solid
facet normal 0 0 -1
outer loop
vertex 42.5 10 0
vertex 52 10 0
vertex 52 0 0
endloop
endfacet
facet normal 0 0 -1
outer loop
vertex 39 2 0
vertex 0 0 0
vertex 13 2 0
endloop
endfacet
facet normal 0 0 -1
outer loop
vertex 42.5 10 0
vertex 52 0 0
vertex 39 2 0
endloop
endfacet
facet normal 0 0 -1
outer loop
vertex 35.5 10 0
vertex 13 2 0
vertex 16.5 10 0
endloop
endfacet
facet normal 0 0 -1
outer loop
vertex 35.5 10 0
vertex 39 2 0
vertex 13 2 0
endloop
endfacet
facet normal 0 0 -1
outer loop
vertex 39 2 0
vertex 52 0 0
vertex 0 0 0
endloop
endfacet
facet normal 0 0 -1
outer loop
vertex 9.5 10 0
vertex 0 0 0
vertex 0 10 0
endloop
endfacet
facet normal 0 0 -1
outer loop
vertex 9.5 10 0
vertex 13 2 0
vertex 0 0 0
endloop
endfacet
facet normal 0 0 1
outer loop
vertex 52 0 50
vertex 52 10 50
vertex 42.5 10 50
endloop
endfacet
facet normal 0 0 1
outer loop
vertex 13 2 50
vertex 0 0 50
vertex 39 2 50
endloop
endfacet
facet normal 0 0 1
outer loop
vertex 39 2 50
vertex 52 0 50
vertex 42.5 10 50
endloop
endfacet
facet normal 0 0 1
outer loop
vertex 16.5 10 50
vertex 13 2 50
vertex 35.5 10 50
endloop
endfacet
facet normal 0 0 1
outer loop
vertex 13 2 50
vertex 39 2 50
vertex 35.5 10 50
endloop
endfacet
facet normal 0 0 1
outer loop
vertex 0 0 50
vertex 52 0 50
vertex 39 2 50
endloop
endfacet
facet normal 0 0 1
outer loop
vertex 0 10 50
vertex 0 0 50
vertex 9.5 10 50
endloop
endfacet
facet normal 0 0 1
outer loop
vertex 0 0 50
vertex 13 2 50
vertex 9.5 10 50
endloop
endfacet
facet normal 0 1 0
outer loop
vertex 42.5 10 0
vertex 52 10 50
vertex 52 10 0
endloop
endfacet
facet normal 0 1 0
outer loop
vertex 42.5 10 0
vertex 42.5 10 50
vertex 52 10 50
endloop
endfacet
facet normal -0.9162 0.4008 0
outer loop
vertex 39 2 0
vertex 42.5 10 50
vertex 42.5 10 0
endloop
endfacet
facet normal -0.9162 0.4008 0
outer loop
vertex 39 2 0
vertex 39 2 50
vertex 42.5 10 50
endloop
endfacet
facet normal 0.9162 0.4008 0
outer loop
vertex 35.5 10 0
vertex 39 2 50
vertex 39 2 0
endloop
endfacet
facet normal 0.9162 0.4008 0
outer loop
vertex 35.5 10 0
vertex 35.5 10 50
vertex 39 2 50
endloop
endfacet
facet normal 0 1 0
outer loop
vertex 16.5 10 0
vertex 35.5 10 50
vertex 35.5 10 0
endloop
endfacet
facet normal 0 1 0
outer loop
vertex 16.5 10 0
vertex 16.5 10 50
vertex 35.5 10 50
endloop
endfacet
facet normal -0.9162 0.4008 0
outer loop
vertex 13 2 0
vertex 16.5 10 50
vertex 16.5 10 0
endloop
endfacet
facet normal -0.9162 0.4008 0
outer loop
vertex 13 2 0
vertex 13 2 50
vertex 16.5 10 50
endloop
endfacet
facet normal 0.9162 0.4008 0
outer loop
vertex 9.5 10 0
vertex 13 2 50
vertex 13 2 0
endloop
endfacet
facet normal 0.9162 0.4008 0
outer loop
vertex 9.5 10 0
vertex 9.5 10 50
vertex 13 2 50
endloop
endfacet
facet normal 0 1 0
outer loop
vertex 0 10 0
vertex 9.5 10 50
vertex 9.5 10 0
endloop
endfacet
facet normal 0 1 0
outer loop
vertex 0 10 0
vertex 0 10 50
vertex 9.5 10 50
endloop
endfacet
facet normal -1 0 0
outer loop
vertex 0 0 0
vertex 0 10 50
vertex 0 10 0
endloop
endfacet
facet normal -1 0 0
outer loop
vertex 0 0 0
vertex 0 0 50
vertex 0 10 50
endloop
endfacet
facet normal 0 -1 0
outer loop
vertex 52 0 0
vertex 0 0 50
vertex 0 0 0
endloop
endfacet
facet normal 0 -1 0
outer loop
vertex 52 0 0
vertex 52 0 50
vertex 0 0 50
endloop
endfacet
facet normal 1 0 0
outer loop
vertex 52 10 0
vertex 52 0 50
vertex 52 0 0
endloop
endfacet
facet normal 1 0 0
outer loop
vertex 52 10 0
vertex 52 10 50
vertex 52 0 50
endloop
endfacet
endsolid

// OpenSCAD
$fn = 32;

// ----------------------------------------------------------------------
// V guide rail: doublev, 52 mm wide
// ----------------------------------------------------------------------

// --- parameters (mm) ---
rail_w = 52;              // rail width, X
base_t = 10;              // base plate thickness
v_depth = 8;              // V feature depth / height
v_half_w = 7;             // half width of the V at the base face
plate_t = 50;             // rail length, Z (the extrusion height)
groove_off = 13;          // offset of each groove from the centreline
fit_tol = 0.02;           // declared fit tolerance (prompt contract)
free_tol = 0.2;           // declared free tolerance (prompt contract)

centre_x = rail_w / 2;  // rail centreline
groove_a = centre_x - groove_off;  // axis of the first groove
groove_b = centre_x + groove_off;  // axis of the second groove

profile = [[0, 0], [52, 0], [52, 10], [42.5, 10], [39, 2], [35.5, 10], [16.5, 10], [13, 2], [9.5, 10], [0, 10]];  // primary outline, 10 points, counter clockwise

// --- the one profile operation ---
linear_extrude(height = plate_t) polygon(points = profile);
